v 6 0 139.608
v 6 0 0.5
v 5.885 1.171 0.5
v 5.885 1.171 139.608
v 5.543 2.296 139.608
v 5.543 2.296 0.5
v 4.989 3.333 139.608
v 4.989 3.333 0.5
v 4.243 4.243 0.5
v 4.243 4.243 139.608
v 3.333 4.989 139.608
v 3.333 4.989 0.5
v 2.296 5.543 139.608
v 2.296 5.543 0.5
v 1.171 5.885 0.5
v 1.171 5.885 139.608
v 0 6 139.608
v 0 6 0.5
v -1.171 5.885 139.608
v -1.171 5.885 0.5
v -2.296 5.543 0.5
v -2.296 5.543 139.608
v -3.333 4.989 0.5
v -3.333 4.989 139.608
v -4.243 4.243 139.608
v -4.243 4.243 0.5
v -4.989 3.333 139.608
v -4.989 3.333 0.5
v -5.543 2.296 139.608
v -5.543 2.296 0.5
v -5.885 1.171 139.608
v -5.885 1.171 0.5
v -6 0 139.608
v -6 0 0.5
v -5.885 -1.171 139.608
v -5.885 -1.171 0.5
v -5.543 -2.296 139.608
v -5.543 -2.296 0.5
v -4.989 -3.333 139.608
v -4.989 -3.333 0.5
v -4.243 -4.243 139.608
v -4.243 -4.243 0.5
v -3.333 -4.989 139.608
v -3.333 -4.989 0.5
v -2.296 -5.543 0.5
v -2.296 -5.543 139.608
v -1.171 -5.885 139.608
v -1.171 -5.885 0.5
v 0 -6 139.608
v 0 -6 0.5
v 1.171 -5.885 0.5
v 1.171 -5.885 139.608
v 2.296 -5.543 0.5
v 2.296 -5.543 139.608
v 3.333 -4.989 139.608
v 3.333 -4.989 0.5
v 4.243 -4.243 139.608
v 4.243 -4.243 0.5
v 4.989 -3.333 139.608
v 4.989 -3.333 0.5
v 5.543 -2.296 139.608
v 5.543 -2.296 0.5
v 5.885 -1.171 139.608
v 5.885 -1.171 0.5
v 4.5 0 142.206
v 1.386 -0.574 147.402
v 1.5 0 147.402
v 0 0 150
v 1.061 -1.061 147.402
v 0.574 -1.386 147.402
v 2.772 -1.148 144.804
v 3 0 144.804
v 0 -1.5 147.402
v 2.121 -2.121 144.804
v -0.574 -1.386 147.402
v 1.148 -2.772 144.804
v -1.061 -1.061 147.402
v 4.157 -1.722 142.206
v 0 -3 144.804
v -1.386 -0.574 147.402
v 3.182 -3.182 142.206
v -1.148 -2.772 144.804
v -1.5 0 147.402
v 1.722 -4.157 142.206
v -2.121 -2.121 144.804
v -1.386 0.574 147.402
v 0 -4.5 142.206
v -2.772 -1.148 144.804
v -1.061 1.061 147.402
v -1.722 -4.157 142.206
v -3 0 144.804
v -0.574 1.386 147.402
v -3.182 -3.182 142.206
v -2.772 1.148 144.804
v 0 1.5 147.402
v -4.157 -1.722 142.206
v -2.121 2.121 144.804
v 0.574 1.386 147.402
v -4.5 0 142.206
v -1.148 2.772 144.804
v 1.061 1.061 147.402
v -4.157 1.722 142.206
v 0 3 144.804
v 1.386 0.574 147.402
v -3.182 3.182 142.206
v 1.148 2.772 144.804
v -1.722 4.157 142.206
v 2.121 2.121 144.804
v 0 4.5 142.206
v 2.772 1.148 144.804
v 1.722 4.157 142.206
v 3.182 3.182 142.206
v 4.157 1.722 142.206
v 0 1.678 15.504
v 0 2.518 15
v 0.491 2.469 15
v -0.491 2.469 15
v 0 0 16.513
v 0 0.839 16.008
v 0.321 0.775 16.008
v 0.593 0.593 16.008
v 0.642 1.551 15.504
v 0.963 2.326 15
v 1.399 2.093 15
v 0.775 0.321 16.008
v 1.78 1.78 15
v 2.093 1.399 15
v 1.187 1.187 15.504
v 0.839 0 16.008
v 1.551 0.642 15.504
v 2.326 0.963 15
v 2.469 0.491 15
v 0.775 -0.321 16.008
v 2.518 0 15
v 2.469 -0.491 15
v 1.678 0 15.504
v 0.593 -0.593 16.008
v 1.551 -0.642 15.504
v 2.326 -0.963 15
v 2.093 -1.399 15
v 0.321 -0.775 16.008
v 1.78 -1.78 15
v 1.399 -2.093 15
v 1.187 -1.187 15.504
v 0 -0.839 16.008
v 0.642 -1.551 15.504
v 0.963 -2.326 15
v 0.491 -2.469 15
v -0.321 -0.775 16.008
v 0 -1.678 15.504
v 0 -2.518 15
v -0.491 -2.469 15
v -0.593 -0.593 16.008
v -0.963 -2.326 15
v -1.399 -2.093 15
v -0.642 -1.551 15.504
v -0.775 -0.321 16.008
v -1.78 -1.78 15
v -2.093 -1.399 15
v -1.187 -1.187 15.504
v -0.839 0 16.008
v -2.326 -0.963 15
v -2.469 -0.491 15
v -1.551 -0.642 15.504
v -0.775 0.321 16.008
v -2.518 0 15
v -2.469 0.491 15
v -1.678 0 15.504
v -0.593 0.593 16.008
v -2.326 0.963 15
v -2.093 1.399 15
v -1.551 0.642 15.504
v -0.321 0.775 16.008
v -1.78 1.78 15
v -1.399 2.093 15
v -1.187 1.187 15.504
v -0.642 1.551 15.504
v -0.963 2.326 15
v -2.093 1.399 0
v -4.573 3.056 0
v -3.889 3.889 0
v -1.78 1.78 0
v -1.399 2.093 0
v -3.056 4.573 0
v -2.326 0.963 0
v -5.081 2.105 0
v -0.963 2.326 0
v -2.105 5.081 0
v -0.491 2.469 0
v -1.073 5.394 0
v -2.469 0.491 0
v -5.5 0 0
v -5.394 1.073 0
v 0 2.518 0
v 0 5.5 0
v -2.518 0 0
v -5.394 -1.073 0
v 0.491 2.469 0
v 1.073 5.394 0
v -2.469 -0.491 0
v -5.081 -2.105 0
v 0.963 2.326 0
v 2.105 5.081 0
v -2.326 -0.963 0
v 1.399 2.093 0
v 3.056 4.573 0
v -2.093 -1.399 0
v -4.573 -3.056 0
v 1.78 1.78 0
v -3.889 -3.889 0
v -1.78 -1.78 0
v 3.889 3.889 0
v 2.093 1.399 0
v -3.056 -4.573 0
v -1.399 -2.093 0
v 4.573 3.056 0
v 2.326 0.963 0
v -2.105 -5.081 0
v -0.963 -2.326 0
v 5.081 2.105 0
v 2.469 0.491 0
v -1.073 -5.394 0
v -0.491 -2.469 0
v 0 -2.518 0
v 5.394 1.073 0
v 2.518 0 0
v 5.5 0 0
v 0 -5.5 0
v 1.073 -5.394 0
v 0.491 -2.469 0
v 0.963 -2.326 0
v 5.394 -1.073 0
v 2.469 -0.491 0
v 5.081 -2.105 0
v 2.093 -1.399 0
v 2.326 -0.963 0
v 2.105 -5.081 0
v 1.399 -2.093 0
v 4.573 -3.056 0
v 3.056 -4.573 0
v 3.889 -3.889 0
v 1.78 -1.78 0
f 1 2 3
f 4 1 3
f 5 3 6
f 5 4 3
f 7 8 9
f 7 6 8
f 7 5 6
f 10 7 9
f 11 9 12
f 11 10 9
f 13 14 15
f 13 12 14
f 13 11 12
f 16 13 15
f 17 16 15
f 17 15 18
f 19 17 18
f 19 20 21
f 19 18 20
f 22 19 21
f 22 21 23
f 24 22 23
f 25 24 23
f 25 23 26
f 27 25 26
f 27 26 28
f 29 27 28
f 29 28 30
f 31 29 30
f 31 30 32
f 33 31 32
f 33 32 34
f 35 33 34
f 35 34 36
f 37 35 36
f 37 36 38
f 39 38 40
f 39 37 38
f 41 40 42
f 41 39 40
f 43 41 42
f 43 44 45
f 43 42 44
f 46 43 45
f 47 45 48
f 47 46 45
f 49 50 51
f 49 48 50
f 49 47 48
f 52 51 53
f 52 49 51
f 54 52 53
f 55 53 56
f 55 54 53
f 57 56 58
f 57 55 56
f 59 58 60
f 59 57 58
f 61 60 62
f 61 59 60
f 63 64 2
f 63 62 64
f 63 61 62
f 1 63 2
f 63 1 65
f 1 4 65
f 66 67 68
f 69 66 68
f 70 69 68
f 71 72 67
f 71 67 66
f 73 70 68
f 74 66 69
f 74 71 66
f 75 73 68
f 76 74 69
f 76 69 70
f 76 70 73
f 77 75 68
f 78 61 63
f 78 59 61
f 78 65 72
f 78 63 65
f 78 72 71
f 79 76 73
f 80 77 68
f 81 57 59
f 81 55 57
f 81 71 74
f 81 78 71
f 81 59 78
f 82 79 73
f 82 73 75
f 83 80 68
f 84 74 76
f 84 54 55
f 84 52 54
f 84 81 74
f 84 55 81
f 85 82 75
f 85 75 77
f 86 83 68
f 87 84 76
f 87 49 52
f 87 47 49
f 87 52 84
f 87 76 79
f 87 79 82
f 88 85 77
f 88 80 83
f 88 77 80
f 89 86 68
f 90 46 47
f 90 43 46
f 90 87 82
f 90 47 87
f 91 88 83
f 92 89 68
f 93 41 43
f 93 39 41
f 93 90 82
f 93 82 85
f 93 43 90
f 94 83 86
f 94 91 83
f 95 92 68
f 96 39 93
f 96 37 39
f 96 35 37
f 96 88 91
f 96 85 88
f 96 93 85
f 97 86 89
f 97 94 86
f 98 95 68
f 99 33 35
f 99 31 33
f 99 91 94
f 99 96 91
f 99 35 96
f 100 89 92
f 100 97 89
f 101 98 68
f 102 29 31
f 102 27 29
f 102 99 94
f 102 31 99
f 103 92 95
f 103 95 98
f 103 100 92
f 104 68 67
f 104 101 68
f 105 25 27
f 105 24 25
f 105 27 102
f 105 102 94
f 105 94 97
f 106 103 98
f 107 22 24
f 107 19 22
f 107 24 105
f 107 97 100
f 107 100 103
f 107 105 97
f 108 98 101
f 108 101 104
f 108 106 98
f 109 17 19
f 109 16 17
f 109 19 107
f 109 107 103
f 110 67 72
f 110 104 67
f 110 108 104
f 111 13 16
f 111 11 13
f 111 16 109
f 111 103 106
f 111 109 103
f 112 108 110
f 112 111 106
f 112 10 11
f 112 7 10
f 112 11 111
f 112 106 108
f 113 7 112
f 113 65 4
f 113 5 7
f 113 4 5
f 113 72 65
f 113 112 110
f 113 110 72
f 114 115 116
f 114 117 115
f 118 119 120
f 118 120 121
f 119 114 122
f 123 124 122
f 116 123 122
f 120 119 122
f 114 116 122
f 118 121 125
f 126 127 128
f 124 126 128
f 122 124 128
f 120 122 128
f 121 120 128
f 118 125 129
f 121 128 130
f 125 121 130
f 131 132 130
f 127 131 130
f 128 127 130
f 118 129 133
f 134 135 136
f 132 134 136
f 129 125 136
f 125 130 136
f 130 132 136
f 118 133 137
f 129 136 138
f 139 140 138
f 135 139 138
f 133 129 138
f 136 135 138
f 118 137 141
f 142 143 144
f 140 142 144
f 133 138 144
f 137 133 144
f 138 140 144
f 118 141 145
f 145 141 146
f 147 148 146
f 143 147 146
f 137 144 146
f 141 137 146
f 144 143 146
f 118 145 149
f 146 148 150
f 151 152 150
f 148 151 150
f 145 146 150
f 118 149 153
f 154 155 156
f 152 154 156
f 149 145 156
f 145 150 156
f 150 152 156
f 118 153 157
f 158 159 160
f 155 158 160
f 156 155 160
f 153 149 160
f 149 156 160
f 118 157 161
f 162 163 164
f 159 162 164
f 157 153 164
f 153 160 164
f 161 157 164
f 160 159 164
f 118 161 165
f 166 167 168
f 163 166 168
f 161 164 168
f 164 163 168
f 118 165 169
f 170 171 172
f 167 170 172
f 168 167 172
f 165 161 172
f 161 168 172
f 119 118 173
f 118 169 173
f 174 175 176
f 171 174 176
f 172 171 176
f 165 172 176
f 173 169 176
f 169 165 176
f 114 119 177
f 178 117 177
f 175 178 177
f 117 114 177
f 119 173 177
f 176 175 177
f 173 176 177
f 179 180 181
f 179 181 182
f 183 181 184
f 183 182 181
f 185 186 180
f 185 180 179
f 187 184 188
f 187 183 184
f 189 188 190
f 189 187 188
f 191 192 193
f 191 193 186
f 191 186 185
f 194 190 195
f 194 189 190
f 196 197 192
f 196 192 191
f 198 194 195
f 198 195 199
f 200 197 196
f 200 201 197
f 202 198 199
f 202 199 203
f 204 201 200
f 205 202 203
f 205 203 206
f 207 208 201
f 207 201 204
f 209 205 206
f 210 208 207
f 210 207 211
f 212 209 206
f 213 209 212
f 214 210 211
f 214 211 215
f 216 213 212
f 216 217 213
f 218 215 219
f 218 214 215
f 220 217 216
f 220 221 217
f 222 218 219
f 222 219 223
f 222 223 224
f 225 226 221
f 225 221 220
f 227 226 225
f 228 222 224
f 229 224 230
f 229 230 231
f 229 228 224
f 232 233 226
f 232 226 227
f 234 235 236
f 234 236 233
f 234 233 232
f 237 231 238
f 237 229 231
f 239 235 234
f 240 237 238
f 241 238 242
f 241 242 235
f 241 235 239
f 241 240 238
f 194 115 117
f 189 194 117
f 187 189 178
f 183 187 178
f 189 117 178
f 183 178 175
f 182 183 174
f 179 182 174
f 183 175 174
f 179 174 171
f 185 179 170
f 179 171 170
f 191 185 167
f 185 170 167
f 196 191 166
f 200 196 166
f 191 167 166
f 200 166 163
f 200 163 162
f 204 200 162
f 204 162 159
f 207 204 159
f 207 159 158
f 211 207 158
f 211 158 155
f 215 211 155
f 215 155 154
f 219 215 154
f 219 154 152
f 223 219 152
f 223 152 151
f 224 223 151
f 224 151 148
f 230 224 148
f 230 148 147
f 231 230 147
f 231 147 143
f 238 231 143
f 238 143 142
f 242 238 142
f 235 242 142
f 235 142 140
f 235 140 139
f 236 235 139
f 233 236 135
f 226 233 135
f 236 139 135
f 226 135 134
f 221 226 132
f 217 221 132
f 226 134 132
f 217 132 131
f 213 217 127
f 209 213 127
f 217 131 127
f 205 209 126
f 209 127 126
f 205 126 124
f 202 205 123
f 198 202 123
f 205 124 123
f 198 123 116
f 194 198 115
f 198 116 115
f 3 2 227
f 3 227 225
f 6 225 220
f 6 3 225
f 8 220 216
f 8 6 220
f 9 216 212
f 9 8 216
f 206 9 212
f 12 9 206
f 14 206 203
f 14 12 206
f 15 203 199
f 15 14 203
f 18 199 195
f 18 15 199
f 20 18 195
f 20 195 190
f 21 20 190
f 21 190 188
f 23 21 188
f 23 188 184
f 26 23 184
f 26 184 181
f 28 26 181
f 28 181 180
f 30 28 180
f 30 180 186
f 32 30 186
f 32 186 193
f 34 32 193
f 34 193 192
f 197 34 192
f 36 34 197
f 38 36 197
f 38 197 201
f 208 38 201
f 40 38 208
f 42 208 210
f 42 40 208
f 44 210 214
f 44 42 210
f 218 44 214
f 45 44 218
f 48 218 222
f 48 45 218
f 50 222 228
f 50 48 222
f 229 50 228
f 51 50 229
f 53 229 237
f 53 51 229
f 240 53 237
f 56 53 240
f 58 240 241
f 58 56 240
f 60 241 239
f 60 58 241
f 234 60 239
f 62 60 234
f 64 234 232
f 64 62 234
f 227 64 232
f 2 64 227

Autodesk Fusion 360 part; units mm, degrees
sketch "Sketch1" plane through (0, 0, 0) normal (0, 1, 0) x (1, 0, 0)
  line L0 (0, 0) -> (6, 0)
  line L1 (6, 0) -> (6, -150)
  line L2 (6, -150) -> (0, -150)
  line L3 (0, -150) -> (0, 0)
  line L4 (0, -150) -> (6, -139.6077)
  dimension "d1" = 12
  dimension "d2" = 150
  dimension "d3" = 30
revolve "Revolve1" add sketch "Sketch1" angle 360 about axis through (0, 0, 150) along (0, 0, -1) contours L0 L1 L3 L4
hole "Hole1" at (0, 0, 0) direction (0, 0, 1) diameter 5.035 depth 15 tip angle 118
chamfer "Chamfer1" distance 0.5 angle 45 1 edges at (-5.594, -2.1697, 0)
